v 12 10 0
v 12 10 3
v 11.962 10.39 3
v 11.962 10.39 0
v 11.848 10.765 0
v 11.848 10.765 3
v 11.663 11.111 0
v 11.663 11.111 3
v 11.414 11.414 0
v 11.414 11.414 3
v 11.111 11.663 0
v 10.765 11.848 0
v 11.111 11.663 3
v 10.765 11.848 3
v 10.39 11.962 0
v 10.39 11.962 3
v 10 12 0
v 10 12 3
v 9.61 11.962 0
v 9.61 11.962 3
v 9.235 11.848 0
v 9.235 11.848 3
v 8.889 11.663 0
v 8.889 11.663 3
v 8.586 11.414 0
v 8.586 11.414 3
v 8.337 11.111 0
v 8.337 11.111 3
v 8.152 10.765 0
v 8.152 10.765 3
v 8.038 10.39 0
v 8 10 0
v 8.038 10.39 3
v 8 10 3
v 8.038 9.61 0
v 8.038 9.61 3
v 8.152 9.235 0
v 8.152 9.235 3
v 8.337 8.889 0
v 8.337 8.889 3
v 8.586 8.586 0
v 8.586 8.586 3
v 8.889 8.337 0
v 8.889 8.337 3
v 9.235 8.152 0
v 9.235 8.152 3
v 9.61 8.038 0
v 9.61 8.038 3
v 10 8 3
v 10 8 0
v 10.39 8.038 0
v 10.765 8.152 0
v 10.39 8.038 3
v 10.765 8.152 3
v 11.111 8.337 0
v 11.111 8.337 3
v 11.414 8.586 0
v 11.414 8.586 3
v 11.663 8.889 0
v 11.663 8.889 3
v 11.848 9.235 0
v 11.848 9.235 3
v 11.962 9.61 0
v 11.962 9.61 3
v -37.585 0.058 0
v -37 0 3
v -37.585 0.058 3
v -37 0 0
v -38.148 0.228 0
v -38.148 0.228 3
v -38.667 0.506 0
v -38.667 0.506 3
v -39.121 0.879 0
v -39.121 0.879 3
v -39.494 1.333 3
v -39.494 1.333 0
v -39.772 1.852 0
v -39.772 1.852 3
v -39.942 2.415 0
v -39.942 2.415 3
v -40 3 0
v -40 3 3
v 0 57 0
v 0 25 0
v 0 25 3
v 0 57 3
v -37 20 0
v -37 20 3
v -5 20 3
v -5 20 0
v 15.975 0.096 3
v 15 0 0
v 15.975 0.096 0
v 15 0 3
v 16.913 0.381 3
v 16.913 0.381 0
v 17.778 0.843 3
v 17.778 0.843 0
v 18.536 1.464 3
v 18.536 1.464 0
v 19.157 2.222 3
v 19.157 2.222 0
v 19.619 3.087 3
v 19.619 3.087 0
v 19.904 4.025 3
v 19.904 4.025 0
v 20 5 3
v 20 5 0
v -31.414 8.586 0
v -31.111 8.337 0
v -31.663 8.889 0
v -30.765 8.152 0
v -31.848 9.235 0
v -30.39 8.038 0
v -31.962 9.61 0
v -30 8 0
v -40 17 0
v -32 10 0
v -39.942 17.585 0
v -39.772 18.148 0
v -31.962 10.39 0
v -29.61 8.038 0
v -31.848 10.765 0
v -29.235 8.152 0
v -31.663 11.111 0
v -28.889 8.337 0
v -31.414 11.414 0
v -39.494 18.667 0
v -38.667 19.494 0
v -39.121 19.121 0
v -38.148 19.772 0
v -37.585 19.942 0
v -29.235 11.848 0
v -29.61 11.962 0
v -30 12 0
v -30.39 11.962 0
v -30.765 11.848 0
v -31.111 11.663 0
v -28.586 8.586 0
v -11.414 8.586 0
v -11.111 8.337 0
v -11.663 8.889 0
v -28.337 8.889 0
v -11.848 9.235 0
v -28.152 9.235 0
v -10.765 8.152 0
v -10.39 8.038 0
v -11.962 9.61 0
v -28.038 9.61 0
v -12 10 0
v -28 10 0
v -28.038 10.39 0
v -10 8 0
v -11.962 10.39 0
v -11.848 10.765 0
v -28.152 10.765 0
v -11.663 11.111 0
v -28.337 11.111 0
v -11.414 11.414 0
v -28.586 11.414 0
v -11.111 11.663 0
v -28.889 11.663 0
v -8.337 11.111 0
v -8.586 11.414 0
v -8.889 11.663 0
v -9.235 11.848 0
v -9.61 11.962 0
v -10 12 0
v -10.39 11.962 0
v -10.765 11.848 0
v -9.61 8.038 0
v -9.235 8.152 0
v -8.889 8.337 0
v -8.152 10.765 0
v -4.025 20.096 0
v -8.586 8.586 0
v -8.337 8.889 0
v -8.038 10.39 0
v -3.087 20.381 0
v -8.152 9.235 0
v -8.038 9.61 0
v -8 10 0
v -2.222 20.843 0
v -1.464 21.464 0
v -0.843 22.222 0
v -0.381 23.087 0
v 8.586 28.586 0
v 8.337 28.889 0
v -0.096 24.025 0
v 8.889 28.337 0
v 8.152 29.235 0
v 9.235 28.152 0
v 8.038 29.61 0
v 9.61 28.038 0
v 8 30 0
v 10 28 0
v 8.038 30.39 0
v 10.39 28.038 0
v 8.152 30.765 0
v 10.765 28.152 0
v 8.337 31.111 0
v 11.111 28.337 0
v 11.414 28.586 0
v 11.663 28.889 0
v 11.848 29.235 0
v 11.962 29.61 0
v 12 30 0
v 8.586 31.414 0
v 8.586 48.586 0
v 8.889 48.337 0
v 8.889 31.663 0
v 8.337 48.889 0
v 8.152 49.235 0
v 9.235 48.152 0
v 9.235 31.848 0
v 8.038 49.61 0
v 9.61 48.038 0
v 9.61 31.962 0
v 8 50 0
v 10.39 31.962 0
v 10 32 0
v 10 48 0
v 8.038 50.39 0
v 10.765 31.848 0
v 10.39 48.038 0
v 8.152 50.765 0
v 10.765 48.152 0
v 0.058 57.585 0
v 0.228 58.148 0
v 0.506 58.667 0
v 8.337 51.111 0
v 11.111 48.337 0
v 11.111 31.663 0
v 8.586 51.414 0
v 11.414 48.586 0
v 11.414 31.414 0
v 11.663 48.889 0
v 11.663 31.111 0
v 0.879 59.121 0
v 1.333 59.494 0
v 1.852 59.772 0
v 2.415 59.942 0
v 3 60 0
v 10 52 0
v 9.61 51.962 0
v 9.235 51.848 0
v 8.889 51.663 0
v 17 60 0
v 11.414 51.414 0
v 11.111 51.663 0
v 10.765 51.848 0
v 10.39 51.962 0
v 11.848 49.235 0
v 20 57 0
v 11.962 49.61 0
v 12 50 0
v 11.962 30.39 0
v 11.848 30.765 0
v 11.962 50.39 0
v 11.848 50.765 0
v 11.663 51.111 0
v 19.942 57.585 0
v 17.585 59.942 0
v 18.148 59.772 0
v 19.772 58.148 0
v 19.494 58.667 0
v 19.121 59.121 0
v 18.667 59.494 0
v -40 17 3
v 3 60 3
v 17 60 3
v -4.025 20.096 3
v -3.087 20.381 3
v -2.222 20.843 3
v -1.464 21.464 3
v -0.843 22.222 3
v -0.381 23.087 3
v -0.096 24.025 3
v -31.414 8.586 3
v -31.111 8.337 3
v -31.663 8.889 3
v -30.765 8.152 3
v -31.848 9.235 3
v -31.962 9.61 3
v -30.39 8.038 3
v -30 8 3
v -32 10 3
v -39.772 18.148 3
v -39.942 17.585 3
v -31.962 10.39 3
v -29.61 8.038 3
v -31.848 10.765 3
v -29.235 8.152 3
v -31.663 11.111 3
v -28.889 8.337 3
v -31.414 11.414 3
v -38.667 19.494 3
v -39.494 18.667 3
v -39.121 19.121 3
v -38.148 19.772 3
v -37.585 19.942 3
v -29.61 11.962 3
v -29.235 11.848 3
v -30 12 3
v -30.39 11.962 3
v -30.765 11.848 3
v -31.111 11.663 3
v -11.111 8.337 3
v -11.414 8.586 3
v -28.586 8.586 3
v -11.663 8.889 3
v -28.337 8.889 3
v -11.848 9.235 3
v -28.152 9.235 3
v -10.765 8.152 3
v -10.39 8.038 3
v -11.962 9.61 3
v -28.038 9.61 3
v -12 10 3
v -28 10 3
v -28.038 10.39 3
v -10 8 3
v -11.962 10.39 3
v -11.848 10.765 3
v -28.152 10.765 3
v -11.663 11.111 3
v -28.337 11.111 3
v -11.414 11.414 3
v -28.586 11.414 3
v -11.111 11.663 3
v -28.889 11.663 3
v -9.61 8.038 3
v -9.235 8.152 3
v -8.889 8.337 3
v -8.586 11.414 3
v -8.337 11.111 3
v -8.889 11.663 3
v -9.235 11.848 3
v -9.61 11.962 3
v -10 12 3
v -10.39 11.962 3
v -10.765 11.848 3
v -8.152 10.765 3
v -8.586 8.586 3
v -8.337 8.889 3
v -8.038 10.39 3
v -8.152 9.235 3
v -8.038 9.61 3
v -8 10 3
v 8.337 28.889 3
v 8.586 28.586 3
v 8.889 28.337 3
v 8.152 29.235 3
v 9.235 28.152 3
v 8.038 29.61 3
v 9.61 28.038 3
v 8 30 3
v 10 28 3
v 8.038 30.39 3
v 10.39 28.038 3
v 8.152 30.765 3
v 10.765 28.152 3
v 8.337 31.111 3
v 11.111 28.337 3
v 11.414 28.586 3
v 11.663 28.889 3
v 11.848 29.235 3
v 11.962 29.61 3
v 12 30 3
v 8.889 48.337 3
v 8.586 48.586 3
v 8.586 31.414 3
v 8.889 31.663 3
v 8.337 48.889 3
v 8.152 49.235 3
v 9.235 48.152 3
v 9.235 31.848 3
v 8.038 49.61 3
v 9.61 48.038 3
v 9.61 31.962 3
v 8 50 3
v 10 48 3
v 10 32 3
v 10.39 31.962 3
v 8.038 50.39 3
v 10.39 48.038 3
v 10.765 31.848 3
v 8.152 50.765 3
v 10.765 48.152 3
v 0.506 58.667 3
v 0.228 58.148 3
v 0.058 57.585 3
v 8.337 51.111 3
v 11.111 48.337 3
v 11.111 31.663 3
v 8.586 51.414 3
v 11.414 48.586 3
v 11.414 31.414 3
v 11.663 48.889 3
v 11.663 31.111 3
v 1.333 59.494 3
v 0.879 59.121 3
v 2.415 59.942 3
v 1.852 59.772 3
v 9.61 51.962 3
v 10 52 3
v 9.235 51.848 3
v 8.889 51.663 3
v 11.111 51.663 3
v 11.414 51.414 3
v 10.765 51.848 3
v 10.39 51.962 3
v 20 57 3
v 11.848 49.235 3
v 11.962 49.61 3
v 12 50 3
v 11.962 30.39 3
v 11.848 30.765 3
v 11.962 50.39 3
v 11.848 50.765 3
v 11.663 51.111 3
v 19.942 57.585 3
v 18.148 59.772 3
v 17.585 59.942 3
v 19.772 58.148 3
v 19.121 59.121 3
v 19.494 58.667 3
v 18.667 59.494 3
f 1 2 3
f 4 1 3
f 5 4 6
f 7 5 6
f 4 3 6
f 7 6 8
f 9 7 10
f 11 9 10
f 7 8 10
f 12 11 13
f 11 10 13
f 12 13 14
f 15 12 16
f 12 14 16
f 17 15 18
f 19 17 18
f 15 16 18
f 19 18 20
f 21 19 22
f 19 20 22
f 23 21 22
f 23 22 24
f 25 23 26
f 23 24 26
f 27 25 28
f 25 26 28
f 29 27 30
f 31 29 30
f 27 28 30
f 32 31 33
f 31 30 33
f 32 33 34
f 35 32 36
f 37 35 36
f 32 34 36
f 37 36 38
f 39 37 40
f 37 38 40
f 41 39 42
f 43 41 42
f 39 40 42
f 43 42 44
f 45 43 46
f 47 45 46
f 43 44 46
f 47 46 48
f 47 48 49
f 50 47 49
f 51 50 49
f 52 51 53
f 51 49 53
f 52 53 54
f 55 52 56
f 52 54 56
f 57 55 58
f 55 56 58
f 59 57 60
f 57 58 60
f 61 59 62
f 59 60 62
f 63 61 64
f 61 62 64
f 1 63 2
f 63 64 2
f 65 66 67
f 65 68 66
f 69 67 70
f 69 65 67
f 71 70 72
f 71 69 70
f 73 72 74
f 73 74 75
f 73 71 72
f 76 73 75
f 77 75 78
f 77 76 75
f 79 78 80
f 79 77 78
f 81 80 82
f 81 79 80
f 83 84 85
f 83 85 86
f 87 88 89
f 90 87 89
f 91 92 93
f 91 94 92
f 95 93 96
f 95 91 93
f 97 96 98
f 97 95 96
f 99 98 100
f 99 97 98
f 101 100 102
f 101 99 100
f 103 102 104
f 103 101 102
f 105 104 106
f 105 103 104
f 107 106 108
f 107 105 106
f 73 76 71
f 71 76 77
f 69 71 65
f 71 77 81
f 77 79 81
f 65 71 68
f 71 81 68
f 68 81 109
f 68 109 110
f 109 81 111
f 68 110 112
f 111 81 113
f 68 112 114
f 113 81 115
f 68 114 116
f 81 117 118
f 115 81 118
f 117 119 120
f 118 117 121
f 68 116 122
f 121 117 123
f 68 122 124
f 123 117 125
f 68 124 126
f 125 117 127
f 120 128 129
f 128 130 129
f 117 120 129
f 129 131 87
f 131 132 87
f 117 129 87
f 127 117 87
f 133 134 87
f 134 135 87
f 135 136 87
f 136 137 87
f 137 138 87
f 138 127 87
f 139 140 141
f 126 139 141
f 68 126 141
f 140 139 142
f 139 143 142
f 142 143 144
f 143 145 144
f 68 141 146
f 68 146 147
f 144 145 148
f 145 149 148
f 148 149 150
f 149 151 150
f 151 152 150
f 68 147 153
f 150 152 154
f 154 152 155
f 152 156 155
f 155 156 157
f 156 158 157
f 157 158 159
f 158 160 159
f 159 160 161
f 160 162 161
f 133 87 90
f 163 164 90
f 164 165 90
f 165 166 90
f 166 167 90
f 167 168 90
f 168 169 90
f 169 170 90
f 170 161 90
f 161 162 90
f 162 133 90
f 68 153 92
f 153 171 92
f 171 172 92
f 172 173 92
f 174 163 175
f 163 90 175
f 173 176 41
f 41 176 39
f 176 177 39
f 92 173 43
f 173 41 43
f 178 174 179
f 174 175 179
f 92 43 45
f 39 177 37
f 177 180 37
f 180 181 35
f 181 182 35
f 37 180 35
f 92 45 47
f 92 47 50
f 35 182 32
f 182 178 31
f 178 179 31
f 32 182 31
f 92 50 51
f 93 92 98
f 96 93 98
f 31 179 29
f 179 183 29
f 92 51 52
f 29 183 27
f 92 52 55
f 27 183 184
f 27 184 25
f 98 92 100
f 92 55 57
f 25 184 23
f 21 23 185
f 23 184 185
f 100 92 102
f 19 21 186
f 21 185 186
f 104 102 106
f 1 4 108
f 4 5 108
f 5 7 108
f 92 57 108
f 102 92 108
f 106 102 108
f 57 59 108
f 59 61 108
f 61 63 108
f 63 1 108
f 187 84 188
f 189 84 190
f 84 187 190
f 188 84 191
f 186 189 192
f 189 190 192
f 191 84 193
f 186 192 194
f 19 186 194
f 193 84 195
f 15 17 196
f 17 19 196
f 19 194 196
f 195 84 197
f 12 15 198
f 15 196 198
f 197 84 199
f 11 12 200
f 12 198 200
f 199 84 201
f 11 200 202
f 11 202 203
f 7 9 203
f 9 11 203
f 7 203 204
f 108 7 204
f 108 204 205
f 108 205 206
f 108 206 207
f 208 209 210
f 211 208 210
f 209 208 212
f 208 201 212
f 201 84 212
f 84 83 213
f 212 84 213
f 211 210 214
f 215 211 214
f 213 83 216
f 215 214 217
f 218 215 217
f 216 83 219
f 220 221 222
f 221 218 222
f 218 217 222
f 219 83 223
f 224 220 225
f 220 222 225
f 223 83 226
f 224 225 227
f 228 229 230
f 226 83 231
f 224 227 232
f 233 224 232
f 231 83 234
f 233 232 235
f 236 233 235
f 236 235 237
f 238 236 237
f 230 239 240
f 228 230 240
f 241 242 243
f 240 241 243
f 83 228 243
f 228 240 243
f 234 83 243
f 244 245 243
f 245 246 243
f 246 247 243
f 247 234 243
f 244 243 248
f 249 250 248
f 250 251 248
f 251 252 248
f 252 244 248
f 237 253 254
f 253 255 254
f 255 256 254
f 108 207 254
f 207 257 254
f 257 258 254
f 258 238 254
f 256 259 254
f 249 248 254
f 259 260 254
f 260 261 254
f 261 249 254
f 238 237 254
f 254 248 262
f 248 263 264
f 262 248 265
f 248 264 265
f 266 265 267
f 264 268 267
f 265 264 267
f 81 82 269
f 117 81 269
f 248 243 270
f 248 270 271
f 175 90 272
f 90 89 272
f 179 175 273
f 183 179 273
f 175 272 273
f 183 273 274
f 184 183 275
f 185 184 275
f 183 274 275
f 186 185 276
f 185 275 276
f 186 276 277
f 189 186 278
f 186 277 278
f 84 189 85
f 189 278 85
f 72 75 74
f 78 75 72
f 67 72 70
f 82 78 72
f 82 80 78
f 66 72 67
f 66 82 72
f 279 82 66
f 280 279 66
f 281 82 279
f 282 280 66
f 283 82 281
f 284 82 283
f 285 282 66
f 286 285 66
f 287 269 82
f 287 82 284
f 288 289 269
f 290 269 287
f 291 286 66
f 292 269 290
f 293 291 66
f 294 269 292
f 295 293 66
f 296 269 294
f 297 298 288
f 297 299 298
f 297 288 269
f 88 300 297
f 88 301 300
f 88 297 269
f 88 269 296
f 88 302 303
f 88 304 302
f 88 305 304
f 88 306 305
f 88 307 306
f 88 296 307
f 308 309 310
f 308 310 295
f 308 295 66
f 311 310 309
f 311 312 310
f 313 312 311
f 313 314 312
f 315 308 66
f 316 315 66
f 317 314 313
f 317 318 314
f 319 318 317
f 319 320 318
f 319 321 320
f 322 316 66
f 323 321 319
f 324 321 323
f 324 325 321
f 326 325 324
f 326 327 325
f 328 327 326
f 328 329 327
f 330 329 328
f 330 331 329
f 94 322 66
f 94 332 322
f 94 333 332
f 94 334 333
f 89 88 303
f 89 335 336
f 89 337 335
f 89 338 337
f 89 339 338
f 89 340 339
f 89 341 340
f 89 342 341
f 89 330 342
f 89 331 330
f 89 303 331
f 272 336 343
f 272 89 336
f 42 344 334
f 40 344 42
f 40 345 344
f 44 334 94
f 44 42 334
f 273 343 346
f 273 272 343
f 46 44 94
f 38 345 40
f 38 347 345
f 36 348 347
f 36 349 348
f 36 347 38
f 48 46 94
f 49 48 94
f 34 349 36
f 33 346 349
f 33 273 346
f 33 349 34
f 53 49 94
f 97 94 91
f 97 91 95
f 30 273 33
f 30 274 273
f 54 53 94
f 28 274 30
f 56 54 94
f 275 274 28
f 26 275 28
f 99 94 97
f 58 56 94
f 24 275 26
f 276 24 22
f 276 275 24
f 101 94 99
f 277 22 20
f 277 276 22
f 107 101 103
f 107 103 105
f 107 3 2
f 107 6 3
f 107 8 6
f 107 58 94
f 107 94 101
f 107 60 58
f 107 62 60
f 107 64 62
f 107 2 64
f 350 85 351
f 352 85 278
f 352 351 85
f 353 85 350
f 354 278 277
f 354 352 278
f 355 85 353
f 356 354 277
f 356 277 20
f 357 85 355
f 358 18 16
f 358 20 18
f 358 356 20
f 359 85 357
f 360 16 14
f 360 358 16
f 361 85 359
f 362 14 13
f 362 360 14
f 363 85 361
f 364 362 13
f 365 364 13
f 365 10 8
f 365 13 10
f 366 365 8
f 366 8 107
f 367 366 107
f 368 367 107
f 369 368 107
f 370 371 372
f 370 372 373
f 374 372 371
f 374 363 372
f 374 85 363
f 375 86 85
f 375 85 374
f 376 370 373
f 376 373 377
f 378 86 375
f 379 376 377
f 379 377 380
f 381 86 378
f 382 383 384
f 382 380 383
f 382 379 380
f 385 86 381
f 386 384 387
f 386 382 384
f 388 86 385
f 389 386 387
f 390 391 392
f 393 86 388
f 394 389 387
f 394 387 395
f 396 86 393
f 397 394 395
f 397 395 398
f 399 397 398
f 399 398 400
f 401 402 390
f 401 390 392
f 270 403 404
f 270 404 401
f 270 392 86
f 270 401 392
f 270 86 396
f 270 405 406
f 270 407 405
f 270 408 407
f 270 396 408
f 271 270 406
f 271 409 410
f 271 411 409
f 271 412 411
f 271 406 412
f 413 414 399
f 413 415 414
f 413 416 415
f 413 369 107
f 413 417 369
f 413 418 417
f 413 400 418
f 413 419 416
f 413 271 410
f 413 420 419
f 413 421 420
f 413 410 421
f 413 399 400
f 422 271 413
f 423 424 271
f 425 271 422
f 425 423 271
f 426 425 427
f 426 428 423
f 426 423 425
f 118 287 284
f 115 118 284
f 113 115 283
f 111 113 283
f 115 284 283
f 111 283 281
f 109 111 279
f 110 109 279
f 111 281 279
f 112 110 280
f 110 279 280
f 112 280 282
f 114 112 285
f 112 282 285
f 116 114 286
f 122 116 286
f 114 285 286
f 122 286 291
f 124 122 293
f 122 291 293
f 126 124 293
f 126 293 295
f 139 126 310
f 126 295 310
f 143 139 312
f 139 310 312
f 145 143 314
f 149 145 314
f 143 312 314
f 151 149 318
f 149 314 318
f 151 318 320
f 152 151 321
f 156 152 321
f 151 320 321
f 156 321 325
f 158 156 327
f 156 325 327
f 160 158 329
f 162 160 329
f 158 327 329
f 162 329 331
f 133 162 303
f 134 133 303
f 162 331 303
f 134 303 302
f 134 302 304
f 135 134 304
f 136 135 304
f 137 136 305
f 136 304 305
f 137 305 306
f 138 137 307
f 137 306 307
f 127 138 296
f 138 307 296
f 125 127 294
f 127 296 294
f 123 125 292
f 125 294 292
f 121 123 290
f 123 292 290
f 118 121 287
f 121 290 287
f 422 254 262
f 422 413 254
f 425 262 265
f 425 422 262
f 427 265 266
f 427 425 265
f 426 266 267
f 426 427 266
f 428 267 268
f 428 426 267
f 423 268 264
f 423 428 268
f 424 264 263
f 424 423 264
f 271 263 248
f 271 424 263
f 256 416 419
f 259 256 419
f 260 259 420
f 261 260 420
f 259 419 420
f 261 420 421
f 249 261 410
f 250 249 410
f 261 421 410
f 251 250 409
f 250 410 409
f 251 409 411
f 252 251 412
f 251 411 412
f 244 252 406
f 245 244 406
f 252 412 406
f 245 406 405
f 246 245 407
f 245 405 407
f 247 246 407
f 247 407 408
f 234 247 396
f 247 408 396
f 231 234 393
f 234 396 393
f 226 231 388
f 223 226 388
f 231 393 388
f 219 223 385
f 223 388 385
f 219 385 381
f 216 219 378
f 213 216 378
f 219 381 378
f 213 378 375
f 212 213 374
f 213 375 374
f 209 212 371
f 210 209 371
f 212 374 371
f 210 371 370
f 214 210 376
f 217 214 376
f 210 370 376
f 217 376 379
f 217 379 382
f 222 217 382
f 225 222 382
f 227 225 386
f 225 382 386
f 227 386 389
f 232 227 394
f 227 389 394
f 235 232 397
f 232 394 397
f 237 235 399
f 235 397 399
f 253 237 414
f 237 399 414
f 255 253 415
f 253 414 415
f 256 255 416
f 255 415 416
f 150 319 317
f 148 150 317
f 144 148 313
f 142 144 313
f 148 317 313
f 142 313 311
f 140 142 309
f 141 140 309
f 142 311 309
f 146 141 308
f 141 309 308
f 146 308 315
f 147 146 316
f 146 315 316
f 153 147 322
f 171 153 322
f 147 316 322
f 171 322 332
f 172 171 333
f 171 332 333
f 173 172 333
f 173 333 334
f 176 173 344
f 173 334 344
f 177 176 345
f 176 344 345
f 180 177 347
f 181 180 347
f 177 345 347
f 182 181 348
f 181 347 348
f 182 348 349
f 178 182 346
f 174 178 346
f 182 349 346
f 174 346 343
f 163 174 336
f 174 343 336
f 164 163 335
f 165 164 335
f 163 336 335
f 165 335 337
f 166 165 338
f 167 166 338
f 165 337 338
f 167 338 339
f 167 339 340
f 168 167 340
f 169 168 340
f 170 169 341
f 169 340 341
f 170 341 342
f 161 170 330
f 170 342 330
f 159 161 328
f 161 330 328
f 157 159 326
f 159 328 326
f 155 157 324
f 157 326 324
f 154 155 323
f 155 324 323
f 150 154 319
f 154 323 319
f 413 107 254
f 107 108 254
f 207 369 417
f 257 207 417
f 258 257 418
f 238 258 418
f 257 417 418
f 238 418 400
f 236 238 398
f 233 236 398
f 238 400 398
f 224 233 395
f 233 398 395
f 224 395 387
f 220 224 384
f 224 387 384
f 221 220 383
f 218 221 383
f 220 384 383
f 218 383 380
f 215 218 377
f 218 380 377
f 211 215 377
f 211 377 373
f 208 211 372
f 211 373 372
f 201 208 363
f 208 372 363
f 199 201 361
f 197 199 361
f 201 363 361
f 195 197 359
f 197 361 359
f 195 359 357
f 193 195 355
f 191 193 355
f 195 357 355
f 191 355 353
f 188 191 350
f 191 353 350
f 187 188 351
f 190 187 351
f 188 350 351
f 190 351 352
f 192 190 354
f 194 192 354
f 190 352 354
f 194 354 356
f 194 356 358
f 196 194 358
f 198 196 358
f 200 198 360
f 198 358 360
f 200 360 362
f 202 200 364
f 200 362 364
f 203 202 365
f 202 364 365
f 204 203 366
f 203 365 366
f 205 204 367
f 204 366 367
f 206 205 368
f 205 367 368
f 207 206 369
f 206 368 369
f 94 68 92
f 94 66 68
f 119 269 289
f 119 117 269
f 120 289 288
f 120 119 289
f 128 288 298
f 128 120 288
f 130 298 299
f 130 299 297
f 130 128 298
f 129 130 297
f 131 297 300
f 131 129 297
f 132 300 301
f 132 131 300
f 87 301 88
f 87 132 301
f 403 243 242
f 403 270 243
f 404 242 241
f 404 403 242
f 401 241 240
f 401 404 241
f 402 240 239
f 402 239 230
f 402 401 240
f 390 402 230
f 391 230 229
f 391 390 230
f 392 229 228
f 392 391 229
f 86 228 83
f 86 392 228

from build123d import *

# Parameters (mm, degrees)
SKETCH_1_W          = 20
SKETCH_1_H          = 60
EXTRUDE_1_DEPTH     = 3
SKETCH_2_W          = 60
SKETCH_2_H          = 20
EXTRUDE_2_DEPTH     = 3
SKETCH_3_R          = 2
CUT_EXTRUDE_1_DEPTH = 3
FILLET_3_R          = 5
FILLET_2_R          = 3


with BuildPart() as part:
    # 草图1 → 凸台-拉伸1 (new body)
    with BuildSketch(Plane.XY):
        with Locations((10, 30)):
            Rectangle(SKETCH_1_W, SKETCH_1_H)
    extrude(amount=EXTRUDE_1_DEPTH)

    # 草图2 → 凸台-拉伸2 (add)
    with BuildSketch(Plane.XY.offset(3)):
        with Locations((-10, 10)):
            Rectangle(SKETCH_2_W, SKETCH_2_H)
    extrude(amount=-EXTRUDE_2_DEPTH)

    # 草图3 → 切除-拉伸1 (cut)
    with BuildSketch(Plane.XY.offset(3)):
        with Locations((10, 10)):
            Circle(SKETCH_3_R)
        with Locations((10, 30)):
            Circle(SKETCH_3_R)
        with Locations((10, 50)):
            Circle(SKETCH_3_R)
        with Locations(Location((-10, 10, 0), (0, 0, 180))):
            Circle(SKETCH_3_R)
        with Locations(Location((-30, 10, 0), (0, 0, 180))):
            Circle(SKETCH_3_R)
    extrude(amount=-CUT_EXTRUDE_1_DEPTH, mode=Mode.SUBTRACT)

    # 圆角3
    fillet_3_edges = [part.edges().sort_by_distance(p)[0] for p in [
        (0, 20, 1.5),
        (20, 0, 1.5),
    ]]
    fillet(fillet_3_edges, radius=FILLET_3_R)

    # 圆角2
    fillet_2_edges = [part.edges().sort_by_distance(p)[0] for p in [
        (-40, 20, 1.5),
        (-40, 0, 1.5),
        (0, 60, 1.5),
        (20, 60, 1.5),
    ]]
    fillet(fillet_2_edges, radius=FILLET_2_R)


solid = part.part
